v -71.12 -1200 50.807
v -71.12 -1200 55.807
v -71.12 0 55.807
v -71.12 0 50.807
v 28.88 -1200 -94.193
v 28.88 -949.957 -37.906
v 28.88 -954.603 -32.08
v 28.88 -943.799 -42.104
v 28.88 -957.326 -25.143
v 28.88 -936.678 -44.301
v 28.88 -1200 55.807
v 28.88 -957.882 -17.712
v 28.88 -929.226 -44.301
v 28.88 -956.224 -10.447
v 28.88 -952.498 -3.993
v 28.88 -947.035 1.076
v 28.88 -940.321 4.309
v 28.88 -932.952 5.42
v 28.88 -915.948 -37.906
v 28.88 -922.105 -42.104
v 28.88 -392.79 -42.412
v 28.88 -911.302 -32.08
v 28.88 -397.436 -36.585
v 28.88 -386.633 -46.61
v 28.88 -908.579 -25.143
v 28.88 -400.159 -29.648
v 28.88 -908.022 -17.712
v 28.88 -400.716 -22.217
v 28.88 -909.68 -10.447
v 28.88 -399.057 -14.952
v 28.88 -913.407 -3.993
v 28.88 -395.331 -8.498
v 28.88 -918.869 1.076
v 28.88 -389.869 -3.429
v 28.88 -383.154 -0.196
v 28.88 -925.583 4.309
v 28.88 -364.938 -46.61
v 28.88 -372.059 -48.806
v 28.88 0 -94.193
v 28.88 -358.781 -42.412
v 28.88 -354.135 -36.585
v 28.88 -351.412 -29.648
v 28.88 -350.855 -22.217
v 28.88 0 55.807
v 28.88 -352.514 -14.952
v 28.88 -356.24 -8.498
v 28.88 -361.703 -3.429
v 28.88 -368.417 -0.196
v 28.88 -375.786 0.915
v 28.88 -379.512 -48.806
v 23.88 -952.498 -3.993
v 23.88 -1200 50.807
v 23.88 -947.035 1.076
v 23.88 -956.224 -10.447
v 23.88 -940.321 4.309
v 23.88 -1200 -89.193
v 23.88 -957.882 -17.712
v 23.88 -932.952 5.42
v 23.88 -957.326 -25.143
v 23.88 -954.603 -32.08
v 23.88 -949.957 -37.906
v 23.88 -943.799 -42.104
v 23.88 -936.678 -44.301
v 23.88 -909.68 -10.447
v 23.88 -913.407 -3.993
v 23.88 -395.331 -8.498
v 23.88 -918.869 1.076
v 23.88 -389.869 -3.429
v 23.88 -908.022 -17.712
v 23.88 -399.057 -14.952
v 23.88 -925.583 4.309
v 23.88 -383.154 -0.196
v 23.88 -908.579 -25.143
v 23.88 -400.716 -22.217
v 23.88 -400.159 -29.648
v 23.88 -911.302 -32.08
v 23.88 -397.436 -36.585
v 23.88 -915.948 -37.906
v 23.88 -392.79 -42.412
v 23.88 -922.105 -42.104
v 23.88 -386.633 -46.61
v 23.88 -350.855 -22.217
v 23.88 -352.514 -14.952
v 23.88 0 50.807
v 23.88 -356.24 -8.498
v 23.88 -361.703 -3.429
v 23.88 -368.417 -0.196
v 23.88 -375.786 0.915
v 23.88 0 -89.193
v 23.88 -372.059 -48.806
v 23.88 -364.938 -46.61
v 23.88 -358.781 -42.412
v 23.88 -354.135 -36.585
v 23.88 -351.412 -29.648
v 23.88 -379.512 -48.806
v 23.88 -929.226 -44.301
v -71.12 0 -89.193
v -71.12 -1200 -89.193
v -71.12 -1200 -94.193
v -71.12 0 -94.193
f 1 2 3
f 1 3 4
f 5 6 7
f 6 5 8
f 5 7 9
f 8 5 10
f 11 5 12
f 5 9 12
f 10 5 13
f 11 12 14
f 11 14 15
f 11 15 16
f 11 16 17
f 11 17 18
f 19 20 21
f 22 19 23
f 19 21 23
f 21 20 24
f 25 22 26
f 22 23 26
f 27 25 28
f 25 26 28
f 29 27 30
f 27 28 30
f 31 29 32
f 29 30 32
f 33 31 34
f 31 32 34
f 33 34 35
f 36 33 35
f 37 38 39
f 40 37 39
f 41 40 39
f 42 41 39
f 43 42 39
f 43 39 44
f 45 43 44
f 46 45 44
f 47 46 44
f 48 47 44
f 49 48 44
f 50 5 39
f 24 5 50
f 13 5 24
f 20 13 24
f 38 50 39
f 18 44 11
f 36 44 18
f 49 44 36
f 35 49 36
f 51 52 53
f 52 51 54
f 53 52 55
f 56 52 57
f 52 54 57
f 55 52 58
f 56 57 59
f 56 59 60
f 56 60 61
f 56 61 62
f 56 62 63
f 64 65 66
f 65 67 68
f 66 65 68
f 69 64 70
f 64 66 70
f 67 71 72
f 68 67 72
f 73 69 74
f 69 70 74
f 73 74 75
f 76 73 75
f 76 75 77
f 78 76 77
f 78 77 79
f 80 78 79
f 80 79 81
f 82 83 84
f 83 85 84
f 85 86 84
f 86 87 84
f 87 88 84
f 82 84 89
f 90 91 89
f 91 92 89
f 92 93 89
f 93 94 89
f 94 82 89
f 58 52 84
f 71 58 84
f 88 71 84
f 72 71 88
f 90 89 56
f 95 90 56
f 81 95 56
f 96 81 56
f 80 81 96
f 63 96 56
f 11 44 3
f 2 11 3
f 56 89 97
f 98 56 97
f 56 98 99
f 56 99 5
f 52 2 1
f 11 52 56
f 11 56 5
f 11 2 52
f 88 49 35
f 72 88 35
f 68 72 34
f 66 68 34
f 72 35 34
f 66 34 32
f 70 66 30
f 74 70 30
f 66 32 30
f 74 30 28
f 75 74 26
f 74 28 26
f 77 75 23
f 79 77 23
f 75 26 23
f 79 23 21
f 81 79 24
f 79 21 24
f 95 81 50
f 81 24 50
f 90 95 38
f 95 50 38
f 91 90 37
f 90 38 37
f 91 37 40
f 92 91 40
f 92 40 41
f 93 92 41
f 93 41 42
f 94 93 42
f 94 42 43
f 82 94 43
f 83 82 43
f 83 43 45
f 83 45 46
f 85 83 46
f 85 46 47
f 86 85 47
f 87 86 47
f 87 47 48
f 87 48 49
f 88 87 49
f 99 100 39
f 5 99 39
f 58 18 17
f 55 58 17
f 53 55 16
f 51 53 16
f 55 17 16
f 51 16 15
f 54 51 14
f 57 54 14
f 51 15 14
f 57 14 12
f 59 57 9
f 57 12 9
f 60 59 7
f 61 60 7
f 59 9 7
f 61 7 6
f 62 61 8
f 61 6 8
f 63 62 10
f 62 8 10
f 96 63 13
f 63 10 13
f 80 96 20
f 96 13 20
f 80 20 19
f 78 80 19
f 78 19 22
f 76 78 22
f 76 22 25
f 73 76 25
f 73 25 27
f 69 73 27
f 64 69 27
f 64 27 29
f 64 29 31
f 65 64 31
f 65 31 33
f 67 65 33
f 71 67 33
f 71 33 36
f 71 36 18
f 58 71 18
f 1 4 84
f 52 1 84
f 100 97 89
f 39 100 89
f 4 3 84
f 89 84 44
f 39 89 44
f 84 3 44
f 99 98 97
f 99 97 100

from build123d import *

# Parameters (mm, degrees)
PAD_DEPTH    = 1200
SKETCH001_R  = 25
POCKET_DEPTH = 11


with BuildPart() as part:
    # Sketch → Pad (new body)
    with BuildSketch(Plane.XZ):
        Polygon((-71.120202, 50.807465), (23.879798, 50.807465), (23.879798, -89.192535), (-71.120202, -89.192535), (-71.120202, -94.192535), (28.879798, -94.192535), (28.879798, 55.807465), (-71.120202, 55.807465), align=None)
    extrude(amount=PAD_DEPTH)

    # Sketch001 (on DatumPlane) → Pocket (cut)
    with BuildSketch(Plane(origin=(28.879798, 0, 0), x_dir=(0, 0, 1), z_dir=(1, 0, 0))):
        with Locations((-19.580029, 932.952332)):
            Circle(SKETCH001_R)
        with Locations((-24.085371, 375.785522)):
            Circle(SKETCH001_R)
    extrude(amount=-POCKET_DEPTH, mode=Mode.SUBTRACT)


solid = part.part
